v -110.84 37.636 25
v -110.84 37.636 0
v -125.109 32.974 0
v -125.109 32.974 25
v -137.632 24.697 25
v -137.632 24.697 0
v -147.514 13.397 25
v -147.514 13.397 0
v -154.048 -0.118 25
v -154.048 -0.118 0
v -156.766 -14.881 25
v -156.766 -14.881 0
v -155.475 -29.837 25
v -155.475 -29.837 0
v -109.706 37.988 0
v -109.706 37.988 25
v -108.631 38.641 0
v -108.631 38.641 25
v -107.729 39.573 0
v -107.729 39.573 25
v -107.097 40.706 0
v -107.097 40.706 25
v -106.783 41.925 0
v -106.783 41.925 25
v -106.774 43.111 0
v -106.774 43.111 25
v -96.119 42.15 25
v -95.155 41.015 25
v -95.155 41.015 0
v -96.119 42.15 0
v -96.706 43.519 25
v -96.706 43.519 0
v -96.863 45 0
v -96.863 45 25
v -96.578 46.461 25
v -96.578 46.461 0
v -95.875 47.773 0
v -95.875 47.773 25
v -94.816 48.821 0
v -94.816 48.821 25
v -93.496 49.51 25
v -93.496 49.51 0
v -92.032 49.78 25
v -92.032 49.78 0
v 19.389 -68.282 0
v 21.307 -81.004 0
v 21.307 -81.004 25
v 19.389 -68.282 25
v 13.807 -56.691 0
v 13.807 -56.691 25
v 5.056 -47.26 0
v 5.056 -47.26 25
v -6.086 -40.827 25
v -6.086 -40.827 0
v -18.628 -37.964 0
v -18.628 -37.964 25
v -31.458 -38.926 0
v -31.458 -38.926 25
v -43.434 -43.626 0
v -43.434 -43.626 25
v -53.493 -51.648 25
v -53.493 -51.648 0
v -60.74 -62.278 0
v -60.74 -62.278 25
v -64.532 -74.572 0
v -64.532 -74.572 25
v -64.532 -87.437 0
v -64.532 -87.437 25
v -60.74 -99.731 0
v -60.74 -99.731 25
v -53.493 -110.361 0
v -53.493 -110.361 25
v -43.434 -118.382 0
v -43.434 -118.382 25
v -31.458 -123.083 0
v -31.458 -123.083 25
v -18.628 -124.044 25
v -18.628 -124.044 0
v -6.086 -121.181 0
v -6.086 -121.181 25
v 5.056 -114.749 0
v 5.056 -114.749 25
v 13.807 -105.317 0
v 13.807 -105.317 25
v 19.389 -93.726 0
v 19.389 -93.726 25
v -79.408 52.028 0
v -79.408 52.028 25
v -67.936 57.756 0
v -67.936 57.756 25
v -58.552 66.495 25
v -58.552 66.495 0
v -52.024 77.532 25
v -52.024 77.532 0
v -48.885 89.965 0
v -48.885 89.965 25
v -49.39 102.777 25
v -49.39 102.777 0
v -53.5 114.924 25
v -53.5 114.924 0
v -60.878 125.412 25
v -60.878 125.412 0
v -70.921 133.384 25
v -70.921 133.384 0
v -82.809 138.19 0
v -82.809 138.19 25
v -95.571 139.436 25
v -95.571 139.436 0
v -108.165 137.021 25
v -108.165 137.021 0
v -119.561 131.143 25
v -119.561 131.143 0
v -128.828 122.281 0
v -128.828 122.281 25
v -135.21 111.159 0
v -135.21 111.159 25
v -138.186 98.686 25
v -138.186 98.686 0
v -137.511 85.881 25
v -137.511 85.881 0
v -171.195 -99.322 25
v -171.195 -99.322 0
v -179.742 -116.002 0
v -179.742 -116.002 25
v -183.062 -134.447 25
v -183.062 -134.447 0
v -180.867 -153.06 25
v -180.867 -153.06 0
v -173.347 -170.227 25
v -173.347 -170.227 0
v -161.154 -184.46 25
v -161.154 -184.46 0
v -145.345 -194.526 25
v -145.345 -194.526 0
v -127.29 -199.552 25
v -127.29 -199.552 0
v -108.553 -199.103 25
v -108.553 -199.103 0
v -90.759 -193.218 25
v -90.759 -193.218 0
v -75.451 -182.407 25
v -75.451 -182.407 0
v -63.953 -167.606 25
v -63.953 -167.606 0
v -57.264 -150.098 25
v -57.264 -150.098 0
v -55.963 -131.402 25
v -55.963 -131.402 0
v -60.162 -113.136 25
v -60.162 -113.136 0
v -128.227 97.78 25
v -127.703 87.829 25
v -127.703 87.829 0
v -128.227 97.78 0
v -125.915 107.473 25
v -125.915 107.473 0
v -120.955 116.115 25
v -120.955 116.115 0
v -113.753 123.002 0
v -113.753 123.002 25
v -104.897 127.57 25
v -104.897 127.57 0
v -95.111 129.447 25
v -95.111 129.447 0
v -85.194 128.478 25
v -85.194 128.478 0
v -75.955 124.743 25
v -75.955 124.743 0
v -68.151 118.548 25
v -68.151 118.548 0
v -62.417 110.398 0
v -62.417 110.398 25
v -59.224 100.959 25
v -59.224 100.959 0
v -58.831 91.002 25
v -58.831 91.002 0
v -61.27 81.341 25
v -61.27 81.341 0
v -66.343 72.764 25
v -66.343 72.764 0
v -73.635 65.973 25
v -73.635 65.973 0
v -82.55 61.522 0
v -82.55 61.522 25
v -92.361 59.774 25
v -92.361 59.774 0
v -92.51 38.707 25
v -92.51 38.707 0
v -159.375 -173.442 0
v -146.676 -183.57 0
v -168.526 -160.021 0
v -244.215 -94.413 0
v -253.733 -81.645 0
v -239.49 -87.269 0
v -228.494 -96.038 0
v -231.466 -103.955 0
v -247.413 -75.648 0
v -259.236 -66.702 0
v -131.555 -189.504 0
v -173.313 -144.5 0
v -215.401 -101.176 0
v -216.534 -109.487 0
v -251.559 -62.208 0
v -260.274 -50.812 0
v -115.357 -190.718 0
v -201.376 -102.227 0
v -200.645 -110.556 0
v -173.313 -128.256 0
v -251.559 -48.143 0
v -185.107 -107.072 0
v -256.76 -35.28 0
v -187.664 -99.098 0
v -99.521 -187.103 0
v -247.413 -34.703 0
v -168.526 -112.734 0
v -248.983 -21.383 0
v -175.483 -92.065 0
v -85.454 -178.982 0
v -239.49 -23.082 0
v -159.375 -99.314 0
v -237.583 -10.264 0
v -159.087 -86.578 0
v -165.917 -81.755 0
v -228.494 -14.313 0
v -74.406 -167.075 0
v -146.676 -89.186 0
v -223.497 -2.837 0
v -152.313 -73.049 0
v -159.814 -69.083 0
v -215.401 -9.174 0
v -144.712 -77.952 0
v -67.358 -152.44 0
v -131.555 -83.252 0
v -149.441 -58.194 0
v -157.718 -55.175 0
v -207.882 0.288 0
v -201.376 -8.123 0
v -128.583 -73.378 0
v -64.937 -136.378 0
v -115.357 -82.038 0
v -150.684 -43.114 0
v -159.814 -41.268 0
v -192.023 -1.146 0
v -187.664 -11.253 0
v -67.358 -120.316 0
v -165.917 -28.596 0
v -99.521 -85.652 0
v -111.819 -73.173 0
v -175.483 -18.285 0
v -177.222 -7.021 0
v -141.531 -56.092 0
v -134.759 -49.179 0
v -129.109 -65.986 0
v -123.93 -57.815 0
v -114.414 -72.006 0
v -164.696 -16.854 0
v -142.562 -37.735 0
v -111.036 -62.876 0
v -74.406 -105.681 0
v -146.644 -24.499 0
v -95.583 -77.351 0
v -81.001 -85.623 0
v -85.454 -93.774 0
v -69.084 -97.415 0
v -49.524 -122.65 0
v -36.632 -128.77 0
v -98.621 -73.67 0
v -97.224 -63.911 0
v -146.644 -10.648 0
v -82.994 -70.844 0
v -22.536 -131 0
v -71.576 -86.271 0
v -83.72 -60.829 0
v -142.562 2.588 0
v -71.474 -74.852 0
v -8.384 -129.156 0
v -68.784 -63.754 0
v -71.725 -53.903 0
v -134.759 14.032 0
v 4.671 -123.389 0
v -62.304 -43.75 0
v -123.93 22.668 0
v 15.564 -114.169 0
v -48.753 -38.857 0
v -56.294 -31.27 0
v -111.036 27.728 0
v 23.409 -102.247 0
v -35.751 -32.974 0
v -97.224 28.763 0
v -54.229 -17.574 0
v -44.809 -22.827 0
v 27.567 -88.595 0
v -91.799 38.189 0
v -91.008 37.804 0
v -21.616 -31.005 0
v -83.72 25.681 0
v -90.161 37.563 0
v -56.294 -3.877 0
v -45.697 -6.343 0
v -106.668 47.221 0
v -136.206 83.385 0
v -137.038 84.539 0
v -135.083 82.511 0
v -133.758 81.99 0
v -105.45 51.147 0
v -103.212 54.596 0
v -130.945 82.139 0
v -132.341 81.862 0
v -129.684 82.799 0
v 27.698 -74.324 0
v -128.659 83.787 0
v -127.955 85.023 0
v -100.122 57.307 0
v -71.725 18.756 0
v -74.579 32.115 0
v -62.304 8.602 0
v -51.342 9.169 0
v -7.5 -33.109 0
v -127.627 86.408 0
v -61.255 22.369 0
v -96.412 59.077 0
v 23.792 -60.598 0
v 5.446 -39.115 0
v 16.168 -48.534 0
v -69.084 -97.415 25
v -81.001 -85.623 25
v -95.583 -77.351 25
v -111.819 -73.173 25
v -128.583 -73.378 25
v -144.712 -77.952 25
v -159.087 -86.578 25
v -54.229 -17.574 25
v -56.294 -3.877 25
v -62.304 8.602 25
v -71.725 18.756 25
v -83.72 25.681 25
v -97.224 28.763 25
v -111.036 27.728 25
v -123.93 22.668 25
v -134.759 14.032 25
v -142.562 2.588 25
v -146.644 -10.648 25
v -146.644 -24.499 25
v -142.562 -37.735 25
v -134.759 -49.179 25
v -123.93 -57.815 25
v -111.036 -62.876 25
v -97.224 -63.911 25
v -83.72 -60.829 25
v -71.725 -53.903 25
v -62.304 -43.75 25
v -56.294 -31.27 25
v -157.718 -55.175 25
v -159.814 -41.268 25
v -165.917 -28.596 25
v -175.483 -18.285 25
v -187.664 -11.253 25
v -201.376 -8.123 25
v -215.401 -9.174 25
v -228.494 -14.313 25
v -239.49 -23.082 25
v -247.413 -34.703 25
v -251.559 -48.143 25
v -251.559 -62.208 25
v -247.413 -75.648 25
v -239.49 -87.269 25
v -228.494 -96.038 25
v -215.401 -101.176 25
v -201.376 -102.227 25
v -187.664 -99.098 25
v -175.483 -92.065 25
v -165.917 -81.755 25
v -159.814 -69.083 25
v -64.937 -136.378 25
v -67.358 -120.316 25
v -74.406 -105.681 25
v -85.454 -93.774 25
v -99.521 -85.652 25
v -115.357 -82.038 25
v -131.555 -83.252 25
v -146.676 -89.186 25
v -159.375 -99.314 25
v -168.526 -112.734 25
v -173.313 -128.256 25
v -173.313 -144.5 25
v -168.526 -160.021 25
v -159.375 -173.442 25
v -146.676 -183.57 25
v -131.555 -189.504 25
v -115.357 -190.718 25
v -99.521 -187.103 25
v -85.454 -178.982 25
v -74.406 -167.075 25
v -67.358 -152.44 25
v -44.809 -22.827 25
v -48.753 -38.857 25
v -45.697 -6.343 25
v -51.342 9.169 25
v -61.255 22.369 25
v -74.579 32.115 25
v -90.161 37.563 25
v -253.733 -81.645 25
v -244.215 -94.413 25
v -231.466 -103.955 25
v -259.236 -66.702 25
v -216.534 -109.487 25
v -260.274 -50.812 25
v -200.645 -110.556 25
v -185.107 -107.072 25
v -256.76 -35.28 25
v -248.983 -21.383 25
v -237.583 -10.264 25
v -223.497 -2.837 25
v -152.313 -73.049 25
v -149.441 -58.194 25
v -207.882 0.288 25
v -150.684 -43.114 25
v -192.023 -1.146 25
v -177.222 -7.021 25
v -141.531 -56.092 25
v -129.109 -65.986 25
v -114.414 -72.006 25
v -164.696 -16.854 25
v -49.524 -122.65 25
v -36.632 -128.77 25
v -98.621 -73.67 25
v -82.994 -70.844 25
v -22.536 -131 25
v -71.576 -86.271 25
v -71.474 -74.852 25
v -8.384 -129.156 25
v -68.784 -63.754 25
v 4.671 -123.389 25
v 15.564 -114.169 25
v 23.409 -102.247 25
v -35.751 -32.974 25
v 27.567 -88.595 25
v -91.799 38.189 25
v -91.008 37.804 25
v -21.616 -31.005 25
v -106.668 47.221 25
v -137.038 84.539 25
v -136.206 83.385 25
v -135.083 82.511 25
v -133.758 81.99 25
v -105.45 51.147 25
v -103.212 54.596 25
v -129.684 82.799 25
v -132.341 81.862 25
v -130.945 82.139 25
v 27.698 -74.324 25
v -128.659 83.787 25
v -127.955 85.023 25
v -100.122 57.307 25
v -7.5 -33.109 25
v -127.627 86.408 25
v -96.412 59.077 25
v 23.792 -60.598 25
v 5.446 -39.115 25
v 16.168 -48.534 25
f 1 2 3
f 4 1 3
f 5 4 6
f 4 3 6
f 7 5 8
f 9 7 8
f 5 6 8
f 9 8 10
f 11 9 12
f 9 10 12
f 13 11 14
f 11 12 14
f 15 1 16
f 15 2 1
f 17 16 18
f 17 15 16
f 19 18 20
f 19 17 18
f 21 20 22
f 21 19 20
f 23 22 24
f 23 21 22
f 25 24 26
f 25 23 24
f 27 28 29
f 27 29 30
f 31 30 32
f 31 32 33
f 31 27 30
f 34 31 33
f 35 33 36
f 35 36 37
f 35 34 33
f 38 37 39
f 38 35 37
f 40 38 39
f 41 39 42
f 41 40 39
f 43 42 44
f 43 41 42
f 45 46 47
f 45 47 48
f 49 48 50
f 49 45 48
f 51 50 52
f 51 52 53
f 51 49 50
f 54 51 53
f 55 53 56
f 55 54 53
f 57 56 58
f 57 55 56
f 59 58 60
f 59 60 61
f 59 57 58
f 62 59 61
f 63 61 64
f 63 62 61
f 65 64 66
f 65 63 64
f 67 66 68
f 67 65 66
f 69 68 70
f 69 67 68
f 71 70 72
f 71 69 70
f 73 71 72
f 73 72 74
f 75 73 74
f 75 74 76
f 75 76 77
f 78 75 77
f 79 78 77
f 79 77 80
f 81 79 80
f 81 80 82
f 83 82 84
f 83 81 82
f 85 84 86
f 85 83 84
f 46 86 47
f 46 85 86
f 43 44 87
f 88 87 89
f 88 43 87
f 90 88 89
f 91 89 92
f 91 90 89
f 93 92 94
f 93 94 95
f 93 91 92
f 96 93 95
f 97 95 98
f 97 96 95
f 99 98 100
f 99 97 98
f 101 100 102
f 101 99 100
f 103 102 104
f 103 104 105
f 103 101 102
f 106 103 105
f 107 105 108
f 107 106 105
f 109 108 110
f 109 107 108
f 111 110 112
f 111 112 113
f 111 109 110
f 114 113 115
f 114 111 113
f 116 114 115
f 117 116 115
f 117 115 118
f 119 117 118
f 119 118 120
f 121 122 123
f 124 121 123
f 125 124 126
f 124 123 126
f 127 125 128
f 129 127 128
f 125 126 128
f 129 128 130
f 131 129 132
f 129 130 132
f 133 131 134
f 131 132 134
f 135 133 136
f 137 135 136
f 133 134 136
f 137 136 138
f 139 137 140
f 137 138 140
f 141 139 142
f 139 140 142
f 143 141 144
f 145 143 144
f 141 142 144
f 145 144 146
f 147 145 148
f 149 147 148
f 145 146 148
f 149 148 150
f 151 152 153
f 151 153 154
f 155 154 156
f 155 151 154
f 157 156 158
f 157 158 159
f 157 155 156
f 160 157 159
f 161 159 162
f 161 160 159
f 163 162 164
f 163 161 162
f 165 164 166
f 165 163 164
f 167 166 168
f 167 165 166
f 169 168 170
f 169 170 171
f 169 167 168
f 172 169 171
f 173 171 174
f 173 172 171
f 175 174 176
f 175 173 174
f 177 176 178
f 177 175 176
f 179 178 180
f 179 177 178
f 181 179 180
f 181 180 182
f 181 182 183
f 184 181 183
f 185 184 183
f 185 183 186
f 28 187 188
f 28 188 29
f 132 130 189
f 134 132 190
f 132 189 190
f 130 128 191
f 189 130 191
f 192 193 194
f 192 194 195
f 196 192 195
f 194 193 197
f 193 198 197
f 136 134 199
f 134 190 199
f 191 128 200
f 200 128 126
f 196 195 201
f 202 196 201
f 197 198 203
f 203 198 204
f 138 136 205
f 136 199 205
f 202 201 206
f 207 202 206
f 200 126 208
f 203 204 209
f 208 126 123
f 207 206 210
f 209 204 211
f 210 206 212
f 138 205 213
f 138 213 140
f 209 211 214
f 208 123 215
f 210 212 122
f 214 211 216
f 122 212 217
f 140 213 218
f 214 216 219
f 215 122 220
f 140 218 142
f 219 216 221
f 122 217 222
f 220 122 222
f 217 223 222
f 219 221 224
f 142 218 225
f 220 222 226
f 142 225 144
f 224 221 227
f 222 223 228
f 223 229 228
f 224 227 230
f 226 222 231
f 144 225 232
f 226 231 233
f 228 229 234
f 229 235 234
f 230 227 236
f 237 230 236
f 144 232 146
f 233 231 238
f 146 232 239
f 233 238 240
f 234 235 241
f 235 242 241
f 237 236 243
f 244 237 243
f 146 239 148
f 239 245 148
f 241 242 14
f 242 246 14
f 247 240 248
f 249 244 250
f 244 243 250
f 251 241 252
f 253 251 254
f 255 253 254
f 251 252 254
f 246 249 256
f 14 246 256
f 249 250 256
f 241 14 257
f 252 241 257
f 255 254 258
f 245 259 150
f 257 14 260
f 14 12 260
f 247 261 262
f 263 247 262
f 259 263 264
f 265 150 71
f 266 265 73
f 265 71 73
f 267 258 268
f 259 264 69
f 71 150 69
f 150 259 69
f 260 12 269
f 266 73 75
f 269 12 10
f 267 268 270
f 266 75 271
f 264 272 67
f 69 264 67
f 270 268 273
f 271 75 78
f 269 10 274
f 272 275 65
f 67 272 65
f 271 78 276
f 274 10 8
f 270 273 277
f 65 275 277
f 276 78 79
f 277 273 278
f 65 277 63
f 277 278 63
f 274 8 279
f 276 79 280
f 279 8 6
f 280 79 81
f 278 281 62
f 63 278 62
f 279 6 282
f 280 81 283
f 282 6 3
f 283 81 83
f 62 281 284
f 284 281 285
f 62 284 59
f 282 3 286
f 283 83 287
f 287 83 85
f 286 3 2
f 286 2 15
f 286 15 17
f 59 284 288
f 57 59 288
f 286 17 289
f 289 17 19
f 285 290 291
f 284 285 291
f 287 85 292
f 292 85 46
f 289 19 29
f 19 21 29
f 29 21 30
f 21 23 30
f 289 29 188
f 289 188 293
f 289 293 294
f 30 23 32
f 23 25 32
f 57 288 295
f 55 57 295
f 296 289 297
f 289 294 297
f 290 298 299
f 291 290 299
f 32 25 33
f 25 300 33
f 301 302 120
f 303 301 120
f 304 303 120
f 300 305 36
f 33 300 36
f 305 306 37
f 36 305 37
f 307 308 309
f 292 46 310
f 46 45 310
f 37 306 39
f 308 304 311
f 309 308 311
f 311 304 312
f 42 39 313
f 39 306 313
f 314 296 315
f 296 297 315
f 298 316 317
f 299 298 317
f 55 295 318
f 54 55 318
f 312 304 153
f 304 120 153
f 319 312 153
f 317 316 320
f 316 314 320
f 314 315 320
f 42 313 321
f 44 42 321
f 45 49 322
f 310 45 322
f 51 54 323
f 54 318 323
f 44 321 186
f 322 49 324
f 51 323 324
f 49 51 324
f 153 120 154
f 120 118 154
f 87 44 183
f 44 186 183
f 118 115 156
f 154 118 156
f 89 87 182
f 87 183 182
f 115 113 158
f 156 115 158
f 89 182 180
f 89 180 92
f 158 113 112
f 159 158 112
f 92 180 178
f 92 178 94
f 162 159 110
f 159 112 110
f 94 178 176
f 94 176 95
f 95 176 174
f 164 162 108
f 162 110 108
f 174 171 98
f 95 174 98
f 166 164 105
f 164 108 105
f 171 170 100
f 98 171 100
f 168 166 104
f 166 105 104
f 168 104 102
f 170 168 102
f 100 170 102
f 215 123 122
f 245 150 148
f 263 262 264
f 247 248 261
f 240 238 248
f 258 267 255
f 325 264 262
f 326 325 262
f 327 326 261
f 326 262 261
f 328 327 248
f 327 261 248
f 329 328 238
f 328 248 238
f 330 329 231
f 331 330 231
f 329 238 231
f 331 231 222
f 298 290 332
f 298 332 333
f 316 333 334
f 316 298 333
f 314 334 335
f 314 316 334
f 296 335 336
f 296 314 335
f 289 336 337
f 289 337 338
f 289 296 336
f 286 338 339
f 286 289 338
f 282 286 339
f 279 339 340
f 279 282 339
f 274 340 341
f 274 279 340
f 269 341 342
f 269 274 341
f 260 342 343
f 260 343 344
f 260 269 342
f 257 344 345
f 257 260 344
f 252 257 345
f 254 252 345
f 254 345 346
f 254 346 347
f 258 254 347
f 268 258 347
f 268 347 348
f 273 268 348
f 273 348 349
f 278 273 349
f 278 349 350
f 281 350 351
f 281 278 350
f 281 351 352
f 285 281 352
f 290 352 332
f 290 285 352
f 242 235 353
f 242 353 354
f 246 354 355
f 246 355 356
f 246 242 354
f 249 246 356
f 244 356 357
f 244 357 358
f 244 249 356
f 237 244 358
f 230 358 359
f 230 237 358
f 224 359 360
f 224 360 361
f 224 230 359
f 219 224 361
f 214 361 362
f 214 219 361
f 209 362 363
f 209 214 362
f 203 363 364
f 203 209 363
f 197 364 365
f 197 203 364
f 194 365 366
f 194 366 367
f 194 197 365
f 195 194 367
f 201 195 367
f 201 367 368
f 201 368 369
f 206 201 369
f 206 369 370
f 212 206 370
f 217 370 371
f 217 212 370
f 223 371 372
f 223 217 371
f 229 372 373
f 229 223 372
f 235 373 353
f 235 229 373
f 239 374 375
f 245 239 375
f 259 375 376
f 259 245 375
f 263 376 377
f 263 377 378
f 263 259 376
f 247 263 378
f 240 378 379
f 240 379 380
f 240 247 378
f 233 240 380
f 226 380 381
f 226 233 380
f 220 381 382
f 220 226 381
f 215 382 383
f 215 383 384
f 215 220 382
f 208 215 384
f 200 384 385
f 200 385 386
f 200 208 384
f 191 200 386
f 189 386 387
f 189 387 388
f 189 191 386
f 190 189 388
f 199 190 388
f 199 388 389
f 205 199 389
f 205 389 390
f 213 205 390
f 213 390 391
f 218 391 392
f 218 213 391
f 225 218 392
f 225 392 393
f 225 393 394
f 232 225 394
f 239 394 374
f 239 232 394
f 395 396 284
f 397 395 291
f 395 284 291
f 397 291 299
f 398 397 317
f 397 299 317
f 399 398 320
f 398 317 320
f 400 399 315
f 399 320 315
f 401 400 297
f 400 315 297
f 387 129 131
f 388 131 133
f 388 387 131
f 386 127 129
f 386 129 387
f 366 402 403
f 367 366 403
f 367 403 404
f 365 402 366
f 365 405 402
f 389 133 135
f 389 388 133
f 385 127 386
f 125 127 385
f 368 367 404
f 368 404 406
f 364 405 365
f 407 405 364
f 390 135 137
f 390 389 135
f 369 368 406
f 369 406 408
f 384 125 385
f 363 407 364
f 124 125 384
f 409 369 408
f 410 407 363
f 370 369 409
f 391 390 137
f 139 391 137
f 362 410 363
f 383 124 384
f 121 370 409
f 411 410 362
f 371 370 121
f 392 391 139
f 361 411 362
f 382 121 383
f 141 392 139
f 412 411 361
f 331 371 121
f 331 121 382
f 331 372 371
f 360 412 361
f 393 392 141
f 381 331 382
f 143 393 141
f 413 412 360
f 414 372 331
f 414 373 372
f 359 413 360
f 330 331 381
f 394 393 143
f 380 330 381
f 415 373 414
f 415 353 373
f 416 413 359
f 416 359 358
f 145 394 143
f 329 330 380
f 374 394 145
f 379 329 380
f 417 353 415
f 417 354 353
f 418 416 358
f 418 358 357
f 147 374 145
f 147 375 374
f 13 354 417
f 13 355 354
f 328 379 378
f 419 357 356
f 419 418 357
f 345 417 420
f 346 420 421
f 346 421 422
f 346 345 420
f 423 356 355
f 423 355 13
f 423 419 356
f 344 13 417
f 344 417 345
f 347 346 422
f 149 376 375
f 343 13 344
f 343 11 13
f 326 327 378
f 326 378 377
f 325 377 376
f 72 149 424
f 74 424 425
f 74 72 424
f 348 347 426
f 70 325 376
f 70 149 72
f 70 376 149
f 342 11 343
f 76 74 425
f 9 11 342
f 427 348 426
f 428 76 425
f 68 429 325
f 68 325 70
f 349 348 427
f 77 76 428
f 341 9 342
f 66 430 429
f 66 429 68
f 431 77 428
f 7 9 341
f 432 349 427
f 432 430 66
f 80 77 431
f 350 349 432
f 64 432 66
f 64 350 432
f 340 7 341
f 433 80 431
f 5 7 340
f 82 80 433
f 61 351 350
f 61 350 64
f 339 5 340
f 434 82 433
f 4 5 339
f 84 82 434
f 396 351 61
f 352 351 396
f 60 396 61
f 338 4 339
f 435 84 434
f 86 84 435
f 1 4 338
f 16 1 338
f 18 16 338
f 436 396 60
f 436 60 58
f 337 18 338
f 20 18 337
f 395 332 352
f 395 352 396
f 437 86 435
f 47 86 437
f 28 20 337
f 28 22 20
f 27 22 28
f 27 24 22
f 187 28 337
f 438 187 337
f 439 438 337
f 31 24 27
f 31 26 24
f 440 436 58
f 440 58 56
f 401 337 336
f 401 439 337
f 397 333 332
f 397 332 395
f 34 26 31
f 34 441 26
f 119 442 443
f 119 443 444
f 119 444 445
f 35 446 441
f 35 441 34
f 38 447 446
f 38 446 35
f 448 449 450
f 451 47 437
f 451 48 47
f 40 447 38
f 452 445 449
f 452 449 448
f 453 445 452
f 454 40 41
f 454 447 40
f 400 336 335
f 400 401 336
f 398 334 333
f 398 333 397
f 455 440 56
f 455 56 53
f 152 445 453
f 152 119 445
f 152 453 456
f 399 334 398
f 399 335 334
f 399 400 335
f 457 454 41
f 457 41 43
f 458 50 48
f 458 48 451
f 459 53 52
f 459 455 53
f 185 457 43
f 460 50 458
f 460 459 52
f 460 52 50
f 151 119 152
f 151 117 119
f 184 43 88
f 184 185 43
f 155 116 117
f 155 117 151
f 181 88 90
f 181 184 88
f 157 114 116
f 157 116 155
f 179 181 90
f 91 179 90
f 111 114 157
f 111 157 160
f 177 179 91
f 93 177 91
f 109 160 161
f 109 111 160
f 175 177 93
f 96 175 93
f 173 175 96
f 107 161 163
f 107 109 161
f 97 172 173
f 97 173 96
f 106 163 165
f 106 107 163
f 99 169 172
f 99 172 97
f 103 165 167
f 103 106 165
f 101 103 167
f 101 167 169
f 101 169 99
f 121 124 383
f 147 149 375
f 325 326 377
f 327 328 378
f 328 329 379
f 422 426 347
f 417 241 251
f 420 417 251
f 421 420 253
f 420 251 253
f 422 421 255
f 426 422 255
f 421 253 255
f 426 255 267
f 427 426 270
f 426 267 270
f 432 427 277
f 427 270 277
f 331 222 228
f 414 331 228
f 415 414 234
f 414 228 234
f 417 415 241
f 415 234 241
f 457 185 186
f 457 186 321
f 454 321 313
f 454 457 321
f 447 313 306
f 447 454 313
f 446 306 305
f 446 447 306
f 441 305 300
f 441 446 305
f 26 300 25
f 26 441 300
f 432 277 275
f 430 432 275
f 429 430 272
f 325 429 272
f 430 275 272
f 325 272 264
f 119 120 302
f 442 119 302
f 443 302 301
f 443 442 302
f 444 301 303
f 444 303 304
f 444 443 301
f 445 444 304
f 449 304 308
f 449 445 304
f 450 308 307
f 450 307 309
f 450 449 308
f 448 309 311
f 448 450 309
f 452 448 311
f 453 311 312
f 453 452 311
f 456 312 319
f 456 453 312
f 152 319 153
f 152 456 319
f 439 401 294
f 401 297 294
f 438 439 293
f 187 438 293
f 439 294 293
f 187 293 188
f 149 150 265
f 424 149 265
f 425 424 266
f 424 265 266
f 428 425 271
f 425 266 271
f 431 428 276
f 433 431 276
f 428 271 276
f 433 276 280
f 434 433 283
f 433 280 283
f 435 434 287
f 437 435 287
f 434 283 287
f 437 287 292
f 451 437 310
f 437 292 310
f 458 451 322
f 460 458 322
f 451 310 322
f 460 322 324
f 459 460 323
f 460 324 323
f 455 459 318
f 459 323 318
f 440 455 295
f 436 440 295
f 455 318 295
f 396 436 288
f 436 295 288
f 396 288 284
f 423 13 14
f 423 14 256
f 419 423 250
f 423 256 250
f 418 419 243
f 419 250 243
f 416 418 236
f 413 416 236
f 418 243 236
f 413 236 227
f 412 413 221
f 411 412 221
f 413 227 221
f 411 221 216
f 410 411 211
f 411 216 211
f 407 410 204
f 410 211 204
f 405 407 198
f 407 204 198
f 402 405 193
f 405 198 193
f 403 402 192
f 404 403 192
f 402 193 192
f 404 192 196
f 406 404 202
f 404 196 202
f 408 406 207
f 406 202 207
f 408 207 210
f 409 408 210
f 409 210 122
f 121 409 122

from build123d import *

# Parameters (mm, degrees)
F0_R     = 54.4924805174
F0_R_2   = 43.1604920117
F0_R_3   = 47.1840335611
F0_R_4   = 46.467
F1_DEPTH = 25
F3_DEPTH = 25
F4_R     = 5


with BuildPart() as f1:
    # F0 (on Top) → F1 (new body)
    with BuildSketch(Plane.XY):
        with BuildLine():
            ThreePointArc((-171.1951607712, -99.3221294101), (-127.2895477252, -199.5524067975), (-60.162123745, -113.1364342468))
            ThreePointArc((-60.162123745, -113.1364342468), (27.5666162737, -88.5949500771), (-48.7532108312, -38.8566322407))
            ThreePointArc((-48.7532108312, -38.8566322407), (-95.9689877261, 38.3611262057), (-155.4748304215, -29.836868577))
            ThreePointArc((-155.4748304215, -29.836868577), (-259.0763673914, -42.9189917909), (-171.1951607712, -99.3221294101))
        make_face()
        with Locations((-119.4296146298, -136.3778748382)):
            Circle(F0_R, mode=Mode.SUBTRACT)
        with Locations((-21.8538418412, -81.0042768717)):
            Circle(F0_R_2, mode=Mode.SUBTRACT)
        with Locations((-204.9019783735, -55.1753938198)):
            Circle(F0_R_3, mode=Mode.SUBTRACT)
        with BuildLine():
            ThreePointArc((-159.087277872, -86.5775758158), (-150.3684240565, -65.719362224), (-150.6837491193, -43.1144057719))
            ThreePointArc((-150.6837491193, -43.1144057719), (-114.4142534505, -72.0060826257), (-68.7840436754, -63.7544607623))
            ThreePointArc((-68.7840436754, -63.7544607623), (-71.8518551472, -80.5585578366), (-69.0841155831, -97.4146773015))
            ThreePointArc((-69.0841155831, -97.4146773015), (-111.819217091, -73.1727968314), (-159.087277872, -86.5775758158))
        make_face(mode=Mode.SUBTRACT)
        with Locations((-100.6964207948, -17.5737444198)):
            Circle(F0_R_4, mode=Mode.SUBTRACT)
    extrude(amount=F1_DEPTH)

    # F2 (on face) → F3 (join)
    with BuildSketch(Plane.XY.offset(25)):
        with BuildLine():
            ThreePointArc((-127.7027924667, 87.8290782041), (-71.8303532525, 121.9260893446), (-92.3607341122, 59.7743468572))
            ThreePointArc((-92.3607341122, 59.7743468572), (-104.6730727654, 52.5942964384), (-105.4238538636, 38.3611262057))
            ThreePointArc((-105.4238538636, 38.3611262057), (-98.4279417265, 38.5146891297), (-91.4672809773, 37.7966570014))
            Line((-91.4672809773, 37.7966570014), (-95.1554035699, 41.0152669471))
            ThreePointArc((-95.1554035699, 41.0152669471), (-96.5776784553, 46.4608516232), (-92.0321108024, 49.7797479798))
            ThreePointArc((-92.0321108024, 49.7797479798), (-65.6130297513, 129.7583871225), (-137.5112819177, 85.881378358))
            ThreePointArc((-137.5112819177, 85.881378358), (-131.6331872692, 81.9509835556), (-127.7027924667, 87.8290782041))
        make_face()
    extrude(amount=-F3_DEPTH)

    # F4
    f4_edges = [f1.edges().sort_by_distance(p)[0] for p in [
        (-105.423854, 38.361126, 12.5),
        (-91.467281, 37.796657, 12.5),
    ]]
    fillet(f4_edges, radius=F4_R)


solid = f1.part
